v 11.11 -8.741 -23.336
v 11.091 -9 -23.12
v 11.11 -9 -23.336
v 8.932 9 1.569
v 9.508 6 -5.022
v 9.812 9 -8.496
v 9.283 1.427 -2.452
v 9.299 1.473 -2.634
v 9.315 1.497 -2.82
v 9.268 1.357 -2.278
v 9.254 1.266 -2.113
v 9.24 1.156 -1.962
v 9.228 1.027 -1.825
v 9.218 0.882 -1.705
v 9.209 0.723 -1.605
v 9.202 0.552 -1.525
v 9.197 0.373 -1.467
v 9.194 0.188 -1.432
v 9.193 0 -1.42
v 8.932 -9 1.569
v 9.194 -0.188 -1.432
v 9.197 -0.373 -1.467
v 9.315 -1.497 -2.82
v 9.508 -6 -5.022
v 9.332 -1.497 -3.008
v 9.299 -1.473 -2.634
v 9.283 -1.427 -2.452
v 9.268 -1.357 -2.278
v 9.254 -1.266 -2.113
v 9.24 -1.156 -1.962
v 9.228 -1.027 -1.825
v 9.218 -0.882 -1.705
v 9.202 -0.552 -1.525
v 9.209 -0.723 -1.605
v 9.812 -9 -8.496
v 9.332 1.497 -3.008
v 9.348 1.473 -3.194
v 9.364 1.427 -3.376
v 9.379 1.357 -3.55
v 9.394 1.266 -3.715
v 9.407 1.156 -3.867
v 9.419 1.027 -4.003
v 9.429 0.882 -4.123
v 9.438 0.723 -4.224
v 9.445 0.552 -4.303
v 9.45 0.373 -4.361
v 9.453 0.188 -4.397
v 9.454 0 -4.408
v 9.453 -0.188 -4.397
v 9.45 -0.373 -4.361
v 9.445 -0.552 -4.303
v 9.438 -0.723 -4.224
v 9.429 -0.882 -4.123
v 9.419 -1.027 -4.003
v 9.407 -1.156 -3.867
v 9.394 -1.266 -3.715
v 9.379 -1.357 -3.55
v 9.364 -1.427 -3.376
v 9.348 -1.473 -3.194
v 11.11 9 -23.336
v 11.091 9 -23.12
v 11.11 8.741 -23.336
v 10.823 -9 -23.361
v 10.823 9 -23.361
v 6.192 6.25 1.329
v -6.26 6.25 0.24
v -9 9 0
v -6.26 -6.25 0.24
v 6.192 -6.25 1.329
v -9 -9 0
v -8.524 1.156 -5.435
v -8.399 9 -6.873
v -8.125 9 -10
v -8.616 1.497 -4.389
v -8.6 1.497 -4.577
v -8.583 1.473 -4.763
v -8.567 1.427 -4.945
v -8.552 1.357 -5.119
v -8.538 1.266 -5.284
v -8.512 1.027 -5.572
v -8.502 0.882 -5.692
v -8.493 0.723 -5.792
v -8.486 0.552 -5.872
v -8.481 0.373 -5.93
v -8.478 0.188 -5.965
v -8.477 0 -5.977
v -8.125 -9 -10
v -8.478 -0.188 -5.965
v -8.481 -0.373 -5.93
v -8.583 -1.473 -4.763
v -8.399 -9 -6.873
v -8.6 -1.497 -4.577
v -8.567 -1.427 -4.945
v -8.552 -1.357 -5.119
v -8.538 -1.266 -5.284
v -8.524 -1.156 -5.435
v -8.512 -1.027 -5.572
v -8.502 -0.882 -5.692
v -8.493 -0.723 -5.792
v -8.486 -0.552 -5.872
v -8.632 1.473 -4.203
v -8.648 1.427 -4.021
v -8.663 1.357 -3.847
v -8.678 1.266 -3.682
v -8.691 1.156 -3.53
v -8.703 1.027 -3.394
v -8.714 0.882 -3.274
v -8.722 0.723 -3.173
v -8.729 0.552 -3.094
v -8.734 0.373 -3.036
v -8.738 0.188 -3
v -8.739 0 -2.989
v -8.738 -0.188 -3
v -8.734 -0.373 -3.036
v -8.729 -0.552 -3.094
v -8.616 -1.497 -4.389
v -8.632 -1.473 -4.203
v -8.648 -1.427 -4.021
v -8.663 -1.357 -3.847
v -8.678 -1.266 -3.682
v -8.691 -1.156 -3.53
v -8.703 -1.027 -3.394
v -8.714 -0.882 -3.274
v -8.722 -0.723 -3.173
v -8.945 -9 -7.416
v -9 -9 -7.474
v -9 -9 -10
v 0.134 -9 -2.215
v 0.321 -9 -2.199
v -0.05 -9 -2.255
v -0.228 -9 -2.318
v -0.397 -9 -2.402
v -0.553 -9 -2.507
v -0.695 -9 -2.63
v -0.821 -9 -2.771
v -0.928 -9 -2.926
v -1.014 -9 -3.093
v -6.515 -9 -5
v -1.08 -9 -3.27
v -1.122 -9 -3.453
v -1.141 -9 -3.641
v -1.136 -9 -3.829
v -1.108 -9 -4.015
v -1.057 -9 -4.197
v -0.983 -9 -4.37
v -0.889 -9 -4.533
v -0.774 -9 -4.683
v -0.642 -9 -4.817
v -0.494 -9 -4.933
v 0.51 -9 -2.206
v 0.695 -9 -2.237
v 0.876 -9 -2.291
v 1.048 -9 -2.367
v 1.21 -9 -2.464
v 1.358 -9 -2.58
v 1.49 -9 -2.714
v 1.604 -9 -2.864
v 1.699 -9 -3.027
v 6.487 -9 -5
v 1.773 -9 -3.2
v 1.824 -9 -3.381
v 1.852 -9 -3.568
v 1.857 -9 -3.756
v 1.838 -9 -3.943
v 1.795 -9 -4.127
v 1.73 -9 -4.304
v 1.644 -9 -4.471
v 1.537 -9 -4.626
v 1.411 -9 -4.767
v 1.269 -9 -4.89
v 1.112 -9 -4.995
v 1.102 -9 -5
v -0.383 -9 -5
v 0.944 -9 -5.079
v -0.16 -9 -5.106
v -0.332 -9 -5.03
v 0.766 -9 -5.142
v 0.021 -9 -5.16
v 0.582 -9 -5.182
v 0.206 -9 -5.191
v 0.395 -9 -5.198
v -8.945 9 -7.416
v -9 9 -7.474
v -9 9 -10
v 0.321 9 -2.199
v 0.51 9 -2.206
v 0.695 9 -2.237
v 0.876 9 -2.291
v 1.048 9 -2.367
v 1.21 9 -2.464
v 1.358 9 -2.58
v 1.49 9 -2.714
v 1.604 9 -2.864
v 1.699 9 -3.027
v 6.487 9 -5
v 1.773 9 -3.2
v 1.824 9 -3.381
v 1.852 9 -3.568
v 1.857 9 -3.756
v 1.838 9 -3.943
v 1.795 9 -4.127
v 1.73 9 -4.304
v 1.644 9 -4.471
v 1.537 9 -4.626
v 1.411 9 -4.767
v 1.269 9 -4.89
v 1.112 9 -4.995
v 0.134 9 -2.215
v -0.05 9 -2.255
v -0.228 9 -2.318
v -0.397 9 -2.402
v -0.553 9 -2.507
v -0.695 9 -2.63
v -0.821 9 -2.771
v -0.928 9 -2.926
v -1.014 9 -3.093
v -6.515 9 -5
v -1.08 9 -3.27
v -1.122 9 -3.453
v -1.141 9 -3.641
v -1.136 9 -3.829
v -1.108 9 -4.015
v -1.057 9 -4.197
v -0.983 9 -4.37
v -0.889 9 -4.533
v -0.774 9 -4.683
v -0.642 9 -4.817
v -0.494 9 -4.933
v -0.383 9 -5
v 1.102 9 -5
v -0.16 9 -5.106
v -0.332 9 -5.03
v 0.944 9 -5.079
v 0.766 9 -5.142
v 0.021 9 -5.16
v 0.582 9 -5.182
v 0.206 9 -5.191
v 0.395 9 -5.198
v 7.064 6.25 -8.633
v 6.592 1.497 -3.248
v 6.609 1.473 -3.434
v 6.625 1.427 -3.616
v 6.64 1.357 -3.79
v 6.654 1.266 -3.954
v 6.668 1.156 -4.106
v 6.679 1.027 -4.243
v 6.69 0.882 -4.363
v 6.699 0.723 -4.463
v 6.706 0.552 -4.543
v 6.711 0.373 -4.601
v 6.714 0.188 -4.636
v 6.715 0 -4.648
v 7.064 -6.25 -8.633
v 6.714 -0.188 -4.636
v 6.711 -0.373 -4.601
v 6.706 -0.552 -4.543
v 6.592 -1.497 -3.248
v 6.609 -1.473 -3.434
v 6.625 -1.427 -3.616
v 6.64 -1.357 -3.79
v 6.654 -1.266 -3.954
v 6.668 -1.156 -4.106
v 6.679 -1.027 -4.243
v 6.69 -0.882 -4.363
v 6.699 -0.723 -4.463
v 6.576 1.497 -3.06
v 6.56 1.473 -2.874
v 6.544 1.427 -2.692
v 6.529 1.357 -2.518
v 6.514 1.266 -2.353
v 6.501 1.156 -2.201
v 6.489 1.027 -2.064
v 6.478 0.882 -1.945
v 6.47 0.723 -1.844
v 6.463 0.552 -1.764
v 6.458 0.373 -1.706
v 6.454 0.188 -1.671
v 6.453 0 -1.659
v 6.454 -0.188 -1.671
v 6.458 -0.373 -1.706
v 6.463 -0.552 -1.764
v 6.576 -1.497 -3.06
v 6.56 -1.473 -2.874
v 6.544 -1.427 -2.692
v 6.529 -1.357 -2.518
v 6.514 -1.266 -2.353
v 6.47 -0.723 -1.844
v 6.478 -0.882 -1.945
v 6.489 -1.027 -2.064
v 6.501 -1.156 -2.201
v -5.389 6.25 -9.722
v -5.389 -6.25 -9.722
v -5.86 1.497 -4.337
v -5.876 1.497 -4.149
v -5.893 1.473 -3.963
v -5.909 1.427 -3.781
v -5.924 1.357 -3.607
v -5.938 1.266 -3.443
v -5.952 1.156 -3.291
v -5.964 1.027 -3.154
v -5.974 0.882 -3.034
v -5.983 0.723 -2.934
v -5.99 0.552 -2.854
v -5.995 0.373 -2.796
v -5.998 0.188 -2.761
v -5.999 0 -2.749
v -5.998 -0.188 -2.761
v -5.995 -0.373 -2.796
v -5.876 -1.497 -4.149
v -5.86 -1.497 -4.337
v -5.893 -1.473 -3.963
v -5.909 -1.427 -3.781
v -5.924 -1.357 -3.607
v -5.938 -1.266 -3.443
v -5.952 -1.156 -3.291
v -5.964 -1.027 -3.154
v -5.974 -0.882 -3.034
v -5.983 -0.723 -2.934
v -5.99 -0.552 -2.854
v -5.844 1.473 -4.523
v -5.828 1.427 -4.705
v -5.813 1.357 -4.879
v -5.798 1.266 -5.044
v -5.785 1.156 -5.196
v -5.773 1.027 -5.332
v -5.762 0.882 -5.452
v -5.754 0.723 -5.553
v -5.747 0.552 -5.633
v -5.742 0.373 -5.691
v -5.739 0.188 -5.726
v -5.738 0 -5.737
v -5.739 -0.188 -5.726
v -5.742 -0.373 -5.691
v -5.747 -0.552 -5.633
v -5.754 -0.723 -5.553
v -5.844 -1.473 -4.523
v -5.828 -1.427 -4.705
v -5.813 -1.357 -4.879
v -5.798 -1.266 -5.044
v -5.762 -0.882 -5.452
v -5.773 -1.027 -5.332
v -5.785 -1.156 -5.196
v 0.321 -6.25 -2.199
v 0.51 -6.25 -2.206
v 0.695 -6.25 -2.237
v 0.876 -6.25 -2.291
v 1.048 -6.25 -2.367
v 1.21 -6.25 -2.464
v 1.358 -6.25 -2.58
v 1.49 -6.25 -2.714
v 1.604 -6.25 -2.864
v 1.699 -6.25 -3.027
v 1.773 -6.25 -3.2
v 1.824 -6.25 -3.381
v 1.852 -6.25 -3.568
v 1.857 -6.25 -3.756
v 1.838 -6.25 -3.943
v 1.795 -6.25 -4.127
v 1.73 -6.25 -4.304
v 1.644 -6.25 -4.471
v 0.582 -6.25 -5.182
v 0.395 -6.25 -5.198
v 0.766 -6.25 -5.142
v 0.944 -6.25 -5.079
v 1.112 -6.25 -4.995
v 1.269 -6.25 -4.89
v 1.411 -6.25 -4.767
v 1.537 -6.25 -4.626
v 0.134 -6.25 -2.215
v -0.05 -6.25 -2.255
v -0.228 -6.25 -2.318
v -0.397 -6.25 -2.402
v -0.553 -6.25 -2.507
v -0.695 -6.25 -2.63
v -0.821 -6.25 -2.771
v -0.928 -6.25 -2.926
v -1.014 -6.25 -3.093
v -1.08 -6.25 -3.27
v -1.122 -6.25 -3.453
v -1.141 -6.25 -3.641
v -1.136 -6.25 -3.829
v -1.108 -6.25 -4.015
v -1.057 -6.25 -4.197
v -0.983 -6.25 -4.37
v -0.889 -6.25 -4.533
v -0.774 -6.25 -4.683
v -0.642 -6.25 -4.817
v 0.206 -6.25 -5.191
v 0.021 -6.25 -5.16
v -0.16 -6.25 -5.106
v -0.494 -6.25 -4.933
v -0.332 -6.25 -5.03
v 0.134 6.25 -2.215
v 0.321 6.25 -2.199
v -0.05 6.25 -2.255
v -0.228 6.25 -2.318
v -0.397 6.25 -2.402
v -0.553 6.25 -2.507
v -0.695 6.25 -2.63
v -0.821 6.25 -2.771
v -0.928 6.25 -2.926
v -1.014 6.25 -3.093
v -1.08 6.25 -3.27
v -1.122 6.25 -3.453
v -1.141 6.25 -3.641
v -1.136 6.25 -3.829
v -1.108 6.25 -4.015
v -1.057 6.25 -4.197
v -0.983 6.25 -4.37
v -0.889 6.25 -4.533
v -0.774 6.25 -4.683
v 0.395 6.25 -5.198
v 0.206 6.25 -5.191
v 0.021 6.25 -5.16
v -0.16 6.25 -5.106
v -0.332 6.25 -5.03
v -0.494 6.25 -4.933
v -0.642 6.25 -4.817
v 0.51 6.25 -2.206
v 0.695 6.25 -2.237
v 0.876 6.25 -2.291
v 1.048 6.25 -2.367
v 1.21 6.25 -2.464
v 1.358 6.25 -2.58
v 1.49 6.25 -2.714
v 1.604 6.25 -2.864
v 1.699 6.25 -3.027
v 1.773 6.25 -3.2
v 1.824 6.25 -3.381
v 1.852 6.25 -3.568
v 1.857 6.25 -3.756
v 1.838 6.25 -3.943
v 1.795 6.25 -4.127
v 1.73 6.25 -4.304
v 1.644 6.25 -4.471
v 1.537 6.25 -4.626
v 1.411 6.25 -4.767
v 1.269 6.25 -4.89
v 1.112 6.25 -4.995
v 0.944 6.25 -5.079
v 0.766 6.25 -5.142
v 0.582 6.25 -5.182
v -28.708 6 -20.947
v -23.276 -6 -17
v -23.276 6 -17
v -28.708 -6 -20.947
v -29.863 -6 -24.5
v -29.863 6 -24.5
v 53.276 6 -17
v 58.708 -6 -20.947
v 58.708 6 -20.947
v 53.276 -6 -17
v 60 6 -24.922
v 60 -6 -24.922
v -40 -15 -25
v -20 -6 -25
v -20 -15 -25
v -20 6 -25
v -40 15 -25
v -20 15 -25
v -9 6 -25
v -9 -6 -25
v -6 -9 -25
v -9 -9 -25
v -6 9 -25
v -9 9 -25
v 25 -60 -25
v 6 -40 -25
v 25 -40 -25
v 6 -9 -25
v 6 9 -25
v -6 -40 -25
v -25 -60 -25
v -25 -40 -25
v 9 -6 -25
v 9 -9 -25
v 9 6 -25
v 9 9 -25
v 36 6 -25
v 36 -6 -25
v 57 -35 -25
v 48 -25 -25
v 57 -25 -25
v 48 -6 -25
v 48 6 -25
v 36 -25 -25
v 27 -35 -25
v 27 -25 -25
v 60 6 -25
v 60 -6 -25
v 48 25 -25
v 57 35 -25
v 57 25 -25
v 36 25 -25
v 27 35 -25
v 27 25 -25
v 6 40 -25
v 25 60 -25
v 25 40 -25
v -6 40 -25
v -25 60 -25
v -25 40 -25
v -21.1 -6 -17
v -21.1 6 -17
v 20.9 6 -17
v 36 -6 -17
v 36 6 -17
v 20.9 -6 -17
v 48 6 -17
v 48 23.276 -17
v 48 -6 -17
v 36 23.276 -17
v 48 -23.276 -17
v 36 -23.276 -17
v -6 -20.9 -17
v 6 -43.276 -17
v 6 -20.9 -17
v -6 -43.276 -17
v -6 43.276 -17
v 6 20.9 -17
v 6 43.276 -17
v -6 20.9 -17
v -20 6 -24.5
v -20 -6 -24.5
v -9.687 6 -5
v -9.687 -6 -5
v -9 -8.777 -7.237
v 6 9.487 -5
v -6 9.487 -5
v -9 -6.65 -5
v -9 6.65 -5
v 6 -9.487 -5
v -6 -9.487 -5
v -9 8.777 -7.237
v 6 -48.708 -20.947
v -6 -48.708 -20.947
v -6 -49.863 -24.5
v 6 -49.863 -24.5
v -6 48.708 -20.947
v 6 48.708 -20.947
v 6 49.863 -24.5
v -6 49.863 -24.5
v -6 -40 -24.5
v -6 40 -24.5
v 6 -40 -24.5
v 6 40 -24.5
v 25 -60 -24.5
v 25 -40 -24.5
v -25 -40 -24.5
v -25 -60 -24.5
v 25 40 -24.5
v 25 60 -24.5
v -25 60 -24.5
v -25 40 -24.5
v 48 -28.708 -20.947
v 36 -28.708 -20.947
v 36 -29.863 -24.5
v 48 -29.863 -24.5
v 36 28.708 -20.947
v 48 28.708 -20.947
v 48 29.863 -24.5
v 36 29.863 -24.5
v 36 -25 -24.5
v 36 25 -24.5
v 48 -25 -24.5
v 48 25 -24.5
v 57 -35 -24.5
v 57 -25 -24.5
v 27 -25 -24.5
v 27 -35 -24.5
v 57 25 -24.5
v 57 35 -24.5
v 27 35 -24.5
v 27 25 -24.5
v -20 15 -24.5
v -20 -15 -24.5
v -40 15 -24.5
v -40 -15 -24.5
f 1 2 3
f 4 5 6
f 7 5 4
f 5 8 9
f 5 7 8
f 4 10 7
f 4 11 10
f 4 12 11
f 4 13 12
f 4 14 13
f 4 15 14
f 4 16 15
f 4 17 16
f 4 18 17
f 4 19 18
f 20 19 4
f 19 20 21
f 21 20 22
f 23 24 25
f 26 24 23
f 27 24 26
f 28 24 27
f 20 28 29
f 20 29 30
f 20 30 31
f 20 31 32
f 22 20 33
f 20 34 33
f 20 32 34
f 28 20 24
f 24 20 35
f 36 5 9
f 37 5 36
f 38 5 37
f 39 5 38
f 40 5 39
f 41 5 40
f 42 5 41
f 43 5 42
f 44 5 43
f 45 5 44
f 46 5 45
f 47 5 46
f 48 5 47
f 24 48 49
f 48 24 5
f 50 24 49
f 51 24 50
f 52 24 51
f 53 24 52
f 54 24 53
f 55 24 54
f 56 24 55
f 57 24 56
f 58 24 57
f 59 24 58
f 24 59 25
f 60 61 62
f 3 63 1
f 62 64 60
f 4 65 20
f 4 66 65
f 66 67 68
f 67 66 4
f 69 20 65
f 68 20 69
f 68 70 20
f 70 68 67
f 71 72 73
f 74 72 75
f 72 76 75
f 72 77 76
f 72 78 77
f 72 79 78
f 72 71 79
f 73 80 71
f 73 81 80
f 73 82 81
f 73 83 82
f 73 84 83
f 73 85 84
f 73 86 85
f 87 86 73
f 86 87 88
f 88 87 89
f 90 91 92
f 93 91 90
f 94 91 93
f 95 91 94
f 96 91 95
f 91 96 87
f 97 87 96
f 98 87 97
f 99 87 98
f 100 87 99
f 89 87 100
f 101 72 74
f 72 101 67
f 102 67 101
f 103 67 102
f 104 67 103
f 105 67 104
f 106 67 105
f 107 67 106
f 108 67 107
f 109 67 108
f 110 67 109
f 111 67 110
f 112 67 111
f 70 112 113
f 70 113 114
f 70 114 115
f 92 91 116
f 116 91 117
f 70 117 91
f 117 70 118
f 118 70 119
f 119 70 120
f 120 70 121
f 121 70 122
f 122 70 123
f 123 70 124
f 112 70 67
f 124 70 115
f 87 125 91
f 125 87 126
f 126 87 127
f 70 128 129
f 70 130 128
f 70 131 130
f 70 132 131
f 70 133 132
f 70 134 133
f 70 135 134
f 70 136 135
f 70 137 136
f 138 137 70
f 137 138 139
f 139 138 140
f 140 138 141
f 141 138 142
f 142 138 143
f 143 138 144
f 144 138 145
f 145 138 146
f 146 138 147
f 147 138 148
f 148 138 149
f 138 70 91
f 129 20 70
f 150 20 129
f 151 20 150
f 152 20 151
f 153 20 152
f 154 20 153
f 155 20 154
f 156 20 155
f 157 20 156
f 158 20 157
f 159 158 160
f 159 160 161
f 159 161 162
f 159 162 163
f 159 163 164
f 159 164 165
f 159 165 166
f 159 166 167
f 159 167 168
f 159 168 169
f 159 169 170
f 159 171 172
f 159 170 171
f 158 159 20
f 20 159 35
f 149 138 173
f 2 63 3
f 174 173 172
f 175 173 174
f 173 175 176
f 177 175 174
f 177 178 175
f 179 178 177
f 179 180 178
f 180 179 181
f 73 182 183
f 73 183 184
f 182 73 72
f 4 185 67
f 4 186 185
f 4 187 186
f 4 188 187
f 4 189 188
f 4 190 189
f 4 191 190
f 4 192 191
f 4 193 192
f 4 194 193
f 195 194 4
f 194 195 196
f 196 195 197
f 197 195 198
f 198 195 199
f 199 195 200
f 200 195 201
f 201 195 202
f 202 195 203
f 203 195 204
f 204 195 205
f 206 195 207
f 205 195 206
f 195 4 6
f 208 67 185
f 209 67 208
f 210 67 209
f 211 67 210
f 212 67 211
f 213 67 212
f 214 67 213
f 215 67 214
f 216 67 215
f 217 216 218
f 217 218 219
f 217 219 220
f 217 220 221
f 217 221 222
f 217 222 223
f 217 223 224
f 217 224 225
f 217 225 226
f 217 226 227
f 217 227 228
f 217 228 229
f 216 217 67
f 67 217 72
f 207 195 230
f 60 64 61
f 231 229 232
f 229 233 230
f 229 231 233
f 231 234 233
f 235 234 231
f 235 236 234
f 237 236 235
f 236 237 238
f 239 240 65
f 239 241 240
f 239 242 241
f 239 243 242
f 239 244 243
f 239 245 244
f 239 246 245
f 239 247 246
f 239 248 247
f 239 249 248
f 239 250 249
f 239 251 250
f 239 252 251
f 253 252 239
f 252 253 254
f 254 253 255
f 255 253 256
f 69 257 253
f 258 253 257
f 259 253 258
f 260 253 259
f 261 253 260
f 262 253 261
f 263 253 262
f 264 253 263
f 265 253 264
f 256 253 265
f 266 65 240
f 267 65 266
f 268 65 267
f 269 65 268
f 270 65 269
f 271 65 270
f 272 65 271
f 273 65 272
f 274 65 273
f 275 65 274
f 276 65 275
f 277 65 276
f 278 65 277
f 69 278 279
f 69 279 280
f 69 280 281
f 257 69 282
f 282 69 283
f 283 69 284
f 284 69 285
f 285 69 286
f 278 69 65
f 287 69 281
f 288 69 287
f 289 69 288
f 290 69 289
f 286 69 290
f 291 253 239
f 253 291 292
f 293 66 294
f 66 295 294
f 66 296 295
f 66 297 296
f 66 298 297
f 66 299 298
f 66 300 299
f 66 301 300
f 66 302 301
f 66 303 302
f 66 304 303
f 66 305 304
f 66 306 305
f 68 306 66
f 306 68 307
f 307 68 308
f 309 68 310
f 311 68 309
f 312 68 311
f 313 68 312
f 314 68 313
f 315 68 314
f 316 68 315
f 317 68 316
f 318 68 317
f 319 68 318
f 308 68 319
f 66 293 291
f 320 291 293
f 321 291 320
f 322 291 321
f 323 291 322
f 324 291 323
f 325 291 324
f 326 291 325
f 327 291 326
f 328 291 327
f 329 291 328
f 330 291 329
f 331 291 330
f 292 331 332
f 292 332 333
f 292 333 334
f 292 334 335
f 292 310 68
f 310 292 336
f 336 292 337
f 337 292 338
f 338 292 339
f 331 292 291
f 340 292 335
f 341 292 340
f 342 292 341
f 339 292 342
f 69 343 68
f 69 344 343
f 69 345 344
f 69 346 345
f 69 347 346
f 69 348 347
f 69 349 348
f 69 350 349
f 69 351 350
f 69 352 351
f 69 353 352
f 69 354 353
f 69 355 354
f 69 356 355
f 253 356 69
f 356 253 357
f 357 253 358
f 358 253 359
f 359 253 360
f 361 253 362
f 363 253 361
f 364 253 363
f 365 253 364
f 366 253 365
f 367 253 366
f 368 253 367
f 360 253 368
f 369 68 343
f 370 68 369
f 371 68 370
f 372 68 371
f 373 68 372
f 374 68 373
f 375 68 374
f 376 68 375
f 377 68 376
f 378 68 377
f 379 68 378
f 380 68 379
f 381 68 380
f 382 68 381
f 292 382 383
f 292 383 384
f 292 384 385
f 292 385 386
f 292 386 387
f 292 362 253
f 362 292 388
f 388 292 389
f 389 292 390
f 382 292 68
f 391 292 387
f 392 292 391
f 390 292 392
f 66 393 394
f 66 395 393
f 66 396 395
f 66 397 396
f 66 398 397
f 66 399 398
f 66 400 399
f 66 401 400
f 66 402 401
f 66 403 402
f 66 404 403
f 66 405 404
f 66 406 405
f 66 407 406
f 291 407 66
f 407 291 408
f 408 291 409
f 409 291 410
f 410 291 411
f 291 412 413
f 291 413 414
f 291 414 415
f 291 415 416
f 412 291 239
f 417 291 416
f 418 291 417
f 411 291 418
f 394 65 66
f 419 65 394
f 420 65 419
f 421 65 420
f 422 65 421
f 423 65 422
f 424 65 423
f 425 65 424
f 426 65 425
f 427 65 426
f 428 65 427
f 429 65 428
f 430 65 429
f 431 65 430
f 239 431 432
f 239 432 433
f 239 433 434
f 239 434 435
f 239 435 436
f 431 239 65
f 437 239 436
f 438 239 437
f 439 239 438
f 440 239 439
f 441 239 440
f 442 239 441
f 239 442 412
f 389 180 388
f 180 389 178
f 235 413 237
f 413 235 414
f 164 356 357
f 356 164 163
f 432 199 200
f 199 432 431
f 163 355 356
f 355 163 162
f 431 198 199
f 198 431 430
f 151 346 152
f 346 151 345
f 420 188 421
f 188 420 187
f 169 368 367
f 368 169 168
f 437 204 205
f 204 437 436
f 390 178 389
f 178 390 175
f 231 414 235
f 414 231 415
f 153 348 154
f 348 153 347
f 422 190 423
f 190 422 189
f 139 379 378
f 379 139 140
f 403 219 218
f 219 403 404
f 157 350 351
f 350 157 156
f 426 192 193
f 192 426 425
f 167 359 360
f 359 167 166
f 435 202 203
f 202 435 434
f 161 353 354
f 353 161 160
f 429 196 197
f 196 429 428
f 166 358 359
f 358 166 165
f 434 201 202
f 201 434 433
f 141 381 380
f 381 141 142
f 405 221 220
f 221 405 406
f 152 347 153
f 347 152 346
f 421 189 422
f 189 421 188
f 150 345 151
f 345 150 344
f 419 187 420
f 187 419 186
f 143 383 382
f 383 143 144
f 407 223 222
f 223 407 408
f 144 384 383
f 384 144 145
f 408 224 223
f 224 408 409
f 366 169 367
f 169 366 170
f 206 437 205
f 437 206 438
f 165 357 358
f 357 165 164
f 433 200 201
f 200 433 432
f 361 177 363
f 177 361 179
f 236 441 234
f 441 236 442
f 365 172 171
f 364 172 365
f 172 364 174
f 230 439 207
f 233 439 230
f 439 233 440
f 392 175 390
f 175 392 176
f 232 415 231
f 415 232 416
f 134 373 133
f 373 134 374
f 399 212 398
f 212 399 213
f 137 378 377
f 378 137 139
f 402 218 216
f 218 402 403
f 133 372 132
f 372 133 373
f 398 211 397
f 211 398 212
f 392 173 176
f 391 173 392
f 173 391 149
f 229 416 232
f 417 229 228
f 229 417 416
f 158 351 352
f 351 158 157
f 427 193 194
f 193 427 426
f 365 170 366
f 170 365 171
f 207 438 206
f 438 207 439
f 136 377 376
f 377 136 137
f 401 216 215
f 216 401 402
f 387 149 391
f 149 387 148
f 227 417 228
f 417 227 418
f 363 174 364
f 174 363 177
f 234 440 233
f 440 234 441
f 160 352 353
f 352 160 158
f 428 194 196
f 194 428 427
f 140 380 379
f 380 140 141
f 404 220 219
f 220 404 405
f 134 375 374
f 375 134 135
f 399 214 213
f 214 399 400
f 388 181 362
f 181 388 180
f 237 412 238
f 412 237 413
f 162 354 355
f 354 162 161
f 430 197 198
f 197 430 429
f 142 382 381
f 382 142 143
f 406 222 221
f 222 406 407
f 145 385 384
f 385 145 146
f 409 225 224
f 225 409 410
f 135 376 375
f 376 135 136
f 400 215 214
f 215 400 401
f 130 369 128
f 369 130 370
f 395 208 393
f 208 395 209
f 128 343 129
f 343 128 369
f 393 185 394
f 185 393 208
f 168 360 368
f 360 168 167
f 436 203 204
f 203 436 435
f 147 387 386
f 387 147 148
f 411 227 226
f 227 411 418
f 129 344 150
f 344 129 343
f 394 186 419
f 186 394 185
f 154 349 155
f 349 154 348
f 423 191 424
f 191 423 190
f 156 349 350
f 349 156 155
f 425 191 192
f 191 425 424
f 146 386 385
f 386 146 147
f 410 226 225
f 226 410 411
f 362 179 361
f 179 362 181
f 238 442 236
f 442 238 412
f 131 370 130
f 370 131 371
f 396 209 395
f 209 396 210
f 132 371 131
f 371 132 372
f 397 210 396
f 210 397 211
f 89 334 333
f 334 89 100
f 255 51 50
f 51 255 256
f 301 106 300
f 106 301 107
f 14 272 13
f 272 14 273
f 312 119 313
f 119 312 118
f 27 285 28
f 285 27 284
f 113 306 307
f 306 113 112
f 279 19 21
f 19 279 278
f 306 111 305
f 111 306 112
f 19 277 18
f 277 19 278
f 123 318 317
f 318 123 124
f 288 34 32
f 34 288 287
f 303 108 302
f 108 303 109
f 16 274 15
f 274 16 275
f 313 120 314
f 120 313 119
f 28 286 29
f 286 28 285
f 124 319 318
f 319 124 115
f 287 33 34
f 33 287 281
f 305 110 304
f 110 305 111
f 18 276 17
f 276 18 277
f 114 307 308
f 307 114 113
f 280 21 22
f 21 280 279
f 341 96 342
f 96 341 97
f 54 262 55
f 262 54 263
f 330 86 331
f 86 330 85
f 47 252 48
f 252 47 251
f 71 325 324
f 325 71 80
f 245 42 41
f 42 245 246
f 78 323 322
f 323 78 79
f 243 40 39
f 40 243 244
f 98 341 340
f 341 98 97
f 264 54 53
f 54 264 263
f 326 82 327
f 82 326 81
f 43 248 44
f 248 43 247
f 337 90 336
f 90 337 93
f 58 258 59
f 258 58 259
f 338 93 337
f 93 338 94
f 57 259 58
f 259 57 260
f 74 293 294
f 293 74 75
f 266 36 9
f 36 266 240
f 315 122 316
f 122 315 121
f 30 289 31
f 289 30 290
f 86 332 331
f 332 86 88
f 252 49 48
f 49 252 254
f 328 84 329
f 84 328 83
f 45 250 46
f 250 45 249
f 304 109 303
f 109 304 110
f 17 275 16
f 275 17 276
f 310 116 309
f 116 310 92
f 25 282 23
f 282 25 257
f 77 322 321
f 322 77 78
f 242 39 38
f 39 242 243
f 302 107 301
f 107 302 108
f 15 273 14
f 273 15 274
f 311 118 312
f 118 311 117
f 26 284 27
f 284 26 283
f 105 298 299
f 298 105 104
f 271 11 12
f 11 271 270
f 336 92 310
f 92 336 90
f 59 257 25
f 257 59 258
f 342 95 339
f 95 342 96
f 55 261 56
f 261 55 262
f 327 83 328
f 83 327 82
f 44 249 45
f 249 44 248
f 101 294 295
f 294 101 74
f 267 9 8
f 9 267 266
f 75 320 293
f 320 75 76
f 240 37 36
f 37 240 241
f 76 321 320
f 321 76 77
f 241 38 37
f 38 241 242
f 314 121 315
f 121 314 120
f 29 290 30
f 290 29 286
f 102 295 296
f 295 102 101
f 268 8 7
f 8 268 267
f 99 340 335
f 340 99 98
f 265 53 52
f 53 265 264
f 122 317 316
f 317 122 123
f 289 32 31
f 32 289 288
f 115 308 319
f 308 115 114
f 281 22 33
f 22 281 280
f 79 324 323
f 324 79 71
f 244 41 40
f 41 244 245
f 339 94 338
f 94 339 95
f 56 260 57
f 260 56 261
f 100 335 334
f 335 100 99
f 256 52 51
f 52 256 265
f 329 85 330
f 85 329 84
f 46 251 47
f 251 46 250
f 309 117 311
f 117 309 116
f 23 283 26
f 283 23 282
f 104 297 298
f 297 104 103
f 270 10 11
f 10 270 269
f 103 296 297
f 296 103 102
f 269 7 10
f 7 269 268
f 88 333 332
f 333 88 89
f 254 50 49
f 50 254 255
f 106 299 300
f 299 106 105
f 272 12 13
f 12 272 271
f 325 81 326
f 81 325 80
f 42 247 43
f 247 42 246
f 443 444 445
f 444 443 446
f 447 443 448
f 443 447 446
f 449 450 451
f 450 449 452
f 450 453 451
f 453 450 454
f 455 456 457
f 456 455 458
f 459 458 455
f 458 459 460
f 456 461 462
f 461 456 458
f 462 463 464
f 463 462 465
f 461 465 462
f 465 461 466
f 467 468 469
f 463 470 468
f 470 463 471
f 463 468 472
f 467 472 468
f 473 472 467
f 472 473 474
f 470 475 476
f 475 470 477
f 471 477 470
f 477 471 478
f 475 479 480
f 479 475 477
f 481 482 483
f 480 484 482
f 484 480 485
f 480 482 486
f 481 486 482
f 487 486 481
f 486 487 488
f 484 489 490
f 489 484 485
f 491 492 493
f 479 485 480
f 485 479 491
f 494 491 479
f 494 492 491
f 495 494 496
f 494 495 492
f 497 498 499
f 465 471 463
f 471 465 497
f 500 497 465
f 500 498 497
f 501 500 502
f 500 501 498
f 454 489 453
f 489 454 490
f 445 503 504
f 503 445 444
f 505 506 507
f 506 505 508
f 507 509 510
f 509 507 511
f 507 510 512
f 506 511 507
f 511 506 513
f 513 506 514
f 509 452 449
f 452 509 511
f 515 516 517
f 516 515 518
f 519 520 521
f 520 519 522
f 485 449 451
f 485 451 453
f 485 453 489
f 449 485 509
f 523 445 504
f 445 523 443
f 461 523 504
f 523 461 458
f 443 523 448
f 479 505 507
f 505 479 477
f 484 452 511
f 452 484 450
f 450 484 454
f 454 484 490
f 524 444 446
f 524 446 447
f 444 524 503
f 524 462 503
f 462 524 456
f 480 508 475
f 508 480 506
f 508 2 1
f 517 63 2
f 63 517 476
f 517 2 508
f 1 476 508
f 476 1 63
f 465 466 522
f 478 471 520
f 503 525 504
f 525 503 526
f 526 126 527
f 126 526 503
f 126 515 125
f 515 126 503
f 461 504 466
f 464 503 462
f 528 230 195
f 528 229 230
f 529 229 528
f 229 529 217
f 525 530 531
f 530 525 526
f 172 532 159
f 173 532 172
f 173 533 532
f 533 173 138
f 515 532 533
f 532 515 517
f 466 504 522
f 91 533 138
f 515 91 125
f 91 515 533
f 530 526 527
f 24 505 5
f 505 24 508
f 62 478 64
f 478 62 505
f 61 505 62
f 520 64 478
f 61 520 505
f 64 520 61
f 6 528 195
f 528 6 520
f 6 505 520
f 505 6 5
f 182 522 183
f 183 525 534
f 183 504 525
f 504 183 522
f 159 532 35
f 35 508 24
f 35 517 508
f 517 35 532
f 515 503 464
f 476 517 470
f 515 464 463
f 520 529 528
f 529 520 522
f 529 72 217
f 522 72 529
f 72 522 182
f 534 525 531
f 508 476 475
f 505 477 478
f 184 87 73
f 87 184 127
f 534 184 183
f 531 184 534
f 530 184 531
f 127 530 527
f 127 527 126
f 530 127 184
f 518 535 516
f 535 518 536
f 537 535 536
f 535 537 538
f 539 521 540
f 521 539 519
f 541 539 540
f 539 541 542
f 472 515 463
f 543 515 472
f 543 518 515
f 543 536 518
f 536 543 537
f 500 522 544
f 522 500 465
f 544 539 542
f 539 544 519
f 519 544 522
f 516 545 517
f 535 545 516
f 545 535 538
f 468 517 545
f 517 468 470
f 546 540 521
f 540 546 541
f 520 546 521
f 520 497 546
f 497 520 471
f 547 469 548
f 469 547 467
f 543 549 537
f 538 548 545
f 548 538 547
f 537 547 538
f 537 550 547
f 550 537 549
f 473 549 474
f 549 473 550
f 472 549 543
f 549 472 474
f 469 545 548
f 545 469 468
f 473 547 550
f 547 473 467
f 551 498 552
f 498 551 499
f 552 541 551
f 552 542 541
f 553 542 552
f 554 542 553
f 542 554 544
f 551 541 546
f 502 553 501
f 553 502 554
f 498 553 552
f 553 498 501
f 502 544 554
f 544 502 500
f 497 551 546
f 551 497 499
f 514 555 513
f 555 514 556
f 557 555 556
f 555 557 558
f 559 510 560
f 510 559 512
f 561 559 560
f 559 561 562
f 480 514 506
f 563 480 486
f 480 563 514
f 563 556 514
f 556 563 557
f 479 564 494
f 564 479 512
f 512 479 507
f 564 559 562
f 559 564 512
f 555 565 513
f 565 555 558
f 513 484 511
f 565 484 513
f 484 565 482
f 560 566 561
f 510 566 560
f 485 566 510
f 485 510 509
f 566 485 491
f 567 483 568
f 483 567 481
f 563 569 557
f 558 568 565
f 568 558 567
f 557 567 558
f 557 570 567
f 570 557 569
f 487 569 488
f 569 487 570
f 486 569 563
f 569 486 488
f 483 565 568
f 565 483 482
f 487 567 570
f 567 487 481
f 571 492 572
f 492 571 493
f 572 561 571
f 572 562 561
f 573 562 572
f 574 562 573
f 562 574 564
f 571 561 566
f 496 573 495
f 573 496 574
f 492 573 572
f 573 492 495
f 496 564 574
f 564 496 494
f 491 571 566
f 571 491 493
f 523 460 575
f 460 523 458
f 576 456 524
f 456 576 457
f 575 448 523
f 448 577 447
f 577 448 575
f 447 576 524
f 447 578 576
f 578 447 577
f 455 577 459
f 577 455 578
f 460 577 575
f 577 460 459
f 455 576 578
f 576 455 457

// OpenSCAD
/* [Configuration] */

// How many levels do you want to display?
Number_Of_Levels=2; // [1,2,3,4,5]

// What should the top size be?
Top_Size = "Medium"; // [Small,Medium,Large,Silly]

// Include Top Front Stopper?
Top_Front_Stopper = false; // [true,false]

// What would you like the Style to be?
Shape_Style = "Hull"; // [RoundedCorner,Hull]

// What would you like the roof to look like?
Hat_Style = "Pyramid"; // [Pyramid,Sphere,None]

// Add Printing frame for flat print?
Print_Tab = true; // [true,false]

// Separate object generation - Base, Back Bottom, Back Standard, Top Side, Top Front
part = "base"; // [base:Base Only,back:Back Only,topside:Top Side Only,topfront:Top Front Only,all:All]

/* [Hidden] */
fn= (Shape_Style == "Hull") ? 10 : 100;

// What should be the top side length?
Top_Side_Length= (Top_Size == "Silly") ? 80 : (Top_Size == "Medium") ? 40 : (Top_Size == "Large") ? 60 :  40;
Top_Front_Length= (Top_Size == "Silly") ? 110 : (Top_Size == "Medium") ? 60 : (Top_Size == "Large") ? 80 :  30;

bridge_height=60;
bridge_width=30;
bridge_length=40;
bridge_thickness=5;
bridge_forwardposition=30;
bridge_topposition1=0;
frame_height1=bridge_topposition1+25;
frame_thickness=12;
back_height=65;
wall_thick=6;
corner_radius = wall_thick*2;
bottomframeWidth1=100; // [80:200]
bottomframeWidth2=60; // [40:100]

sidebar_length=30;
frontbar_length=40;
feet_height=8;

// V4
// Another top which is slanted
// Mustash top?
// Add holes in top side for glasses frame (as guide on insertion)

//buildBridge(bridge_topposition1-20);
//buildBridge(bridge_topposition2-15);


print_part();


module print_part() {

	if (part == "base") {
		buildBase();
	} else if (part == "back") {
		buildBack(true,(back_height),(frame_height1));
	} else if (part == "topside") {
		smalltopside((frame_height1-5));
	} else if (part == "topfront") {
		smalltopfront((frame_height1-5));
	} else if (part == "all") {
		all();
	} else {
		all();
	}

}




module all() {

	translate([0,0,-10]) buildBase();
	rotate([0,-4,0]) buildBack(true,back_height,frame_height1);

	rotate([0,-4,0]) smalltopside(frame_height1);
	rotate([0,-4,180]) smalltopside(frame_height1);
	rotate([0,-4,0]) smalltopfront(frame_height1);

	for ( i = [2 : 1 : Number_Of_Levels] )
	{
		translate([(-3*i),0,(back_height)*(i-1)+5]) rotate([0,-4,0]) buildBack(true,(back_height),(frame_height1));
		translate([(-3*i),0,(back_height)*(i-1)+5]) rotate([0,-4,0]) smalltopside((frame_height1));
		translate([(-3*i),0,(back_height)*(i-1)+5]) rotate([0,-4,180]) smalltopside((frame_height1));
		translate([(-3*i),0,(back_height)*(i-1)+5]) rotate([0,-4,0]) smalltopfront((frame_height1));
	}

	// Build little pyramid hat to go on top
	rotate([0,-4,0]) translate([0,0,(back_height*Number_Of_Levels)+5]) buildRoof();
}




module fulltop() {
	//Wings for full frame holding
	//translate([-3,-10,frame_height1]) hmaleBar(sidebar_length, ginnerWidth, gouterWidth, gcrossOver);
	//rotate([0,0,180]) translate([-3,-10,frame_height1]) hmaleBar(sidebar_length, ginnerWidth, gouterWidth, gcrossOver);
	//rotate([0,0,90]) translate([-3,-10,frame_height1]) hmaleBar(frontbar_length, ginnerWidth, gouterWidth, gcrossOver);
}


module smalltopfront(iframeheight) {
	rotate([0,0,90]) translate([-gouterWidth/2,-30,iframeheight]) hmaleBar(9, ginnerWidth, gouterWidth, gcrossOver);

	rotate([0,0,90]) difference() {
		union() {
			translate([0,-40,iframeheight+5]) rotate([90,0,0]) scale([1.5,1,1]) cylinder(Top_Front_Length,7,7,$fn=fn);
			translate([0,-40,iframeheight+5+2.5]) cube(size=[20,2,20],center=true);
			if (Top_Front_Stopper) 
				translate([0,-(40+Top_Front_Length),iframeheight+5+2.5]) cube(size=[20,2,20],center=true);
		}
		translate([0,-12-Top_Front_Length,iframeheight-7]) cube(size=[22,Top_Front_Length*2,20],center=true);
	}
}

module smalltopside(iframeheight) {
	//Wings for small frame holding (colapsed)
	translate([-gouterWidth/2,-30,iframeheight]) hmaleBar(9, ginnerWidth, gouterWidth, gcrossOver);

	difference() {
		union() {
			translate([0,-39,iframeheight+5]) rotate([90,0,0]) cylinder(Top_Side_Length,5,5,$fn=fn);
			translate([0,-39,iframeheight+5+2.5]) cube(size=[12,2,15],center=true);
			translate([0,-39-Top_Side_Length,iframeheight+5+2.5]) cube(size=[12,2,15],center=true);
		}
		translate([0,-11-Top_Side_Length,iframeheight-7]) cube(size=[20,Top_Side_Length*2,20],center=true);
	}
}



module buildRoof() {

	translate([-(gouterWidth)/2,-(gouterWidth)/2,0]) rotate([-90,0,0]) hmaleBar(25, ginnerWidth, gouterWidth, gcrossOver);

	if (Hat_Style == "Pyramid") {
		hull() {
			translate([0,0,20]) rotate([90,0,45]) Isosceles_Triangle(angle=25, H=40, center=true);
			translate([0,0,20]) rotate([90,0,-45]) Isosceles_Triangle(angle=25, H=40, center=true);
		}
	} else if (Hat_Style == "Sphere") {
		translate([0,0,25]) sphere(r=11,center=true);
	} else {

	}
}



module buildBridge(z=0) {
	difference () {
		translate([bridge_forwardposition,0,z]) rotate([0,90,0]) scale([2,1,1]) cylinder(bridge_length,bridge_width,bridge_height,$fn=50);

		translate([bridge_forwardposition-2,0,z]) rotate([0,90,0]) scale([2,1,1]) cylinder(bridge_length+10,bridge_width-bridge_thickness,bridge_height-bridge_thickness,$fn=50);

		// Cut away bottom of bridge
		translate([49+bridge_forwardposition,0,-30+z]) cube(size=[100,100,100],center=true);
	}
}





module buildBack(center=true, ibackheight, iframeheight) {


	// Back
	translate([-(gouterWidth)/2,-(gouterWidth)/2,0]) rotate([-90,0,0]) hmaleBar(25, ginnerWidth, gouterWidth, gcrossOver);
	translate([-3,0,(ibackheight-8)/2]) cube(size=[frame_thickness,frame_thickness,(ibackheight-8)-25],center=true);
	translate([-gouterWidth/2,gouterWidth/2,ibackheight-8]) rotate([90,0,0]) hfemaleBar(25, ginnerWidth, gouterWidth, gwidthGap, gcrossOver);

	// Bottom of Back
if (Shape_Style == "Hull") {
	hull(){
	difference() {
		union() {
			translate([(frame_thickness/2)-3,frame_thickness/2,25]) rotate([0,-90,0]) rounded_corner(0,0,corner_radius,corner_radius,frame_thickness);
			translate([(-frame_thickness/2)-3,-frame_thickness/2,25]) rotate([0,-90,180]) rounded_corner(0,0,corner_radius,corner_radius,frame_thickness);
			translate([(frame_thickness/2)-3,-frame_thickness/2,25]) rotate([0,-90,-90]) rounded_corner(0,0,corner_radius,corner_radius,frame_thickness);
		}

		translate([-3,(-5)-(gouterWidth/2),25]) cube(size=[15,10,10],center=true);
		translate([-3,(+5)+(gouterWidth/2),25]) cube(size=[15,10,10],center=true);
		translate([(+5)+(gouterWidth/2),0,25]) cube(size=[10,15,10],center=true);
	}
	}
}
else {
	difference() {
		union() {
			translate([(frame_thickness/2)-3,frame_thickness/2,25]) rotate([0,-90,0]) rounded_corner(0,0,corner_radius,corner_radius,frame_thickness);
			translate([(-frame_thickness/2)-3,-frame_thickness/2,25]) rotate([0,-90,180]) rounded_corner(0,0,corner_radius,corner_radius,frame_thickness);
			translate([(frame_thickness/2)-3,-frame_thickness/2,25]) rotate([0,-90,-90]) rounded_corner(0,0,corner_radius,corner_radius,frame_thickness);
		}

		translate([-3,(-5)-(gouterWidth/2),25]) cube(size=[15,10,10],center=true);
		translate([-3,(+5)+(gouterWidth/2),25]) cube(size=[15,10,10],center=true);
		translate([(+5)+(gouterWidth/2),0,25]) cube(size=[10,15,10],center=true);
	}
}

	// Curve for middle joint
if (Shape_Style == "Hull") {
	difference() {
	hull() {
		translate([-(frame_thickness/2)-3,(frame_thickness/2),iframeheight]) rotate([0,90,0]) rounded_corner(0,0,corner_radius,corner_radius,frame_thickness);
		translate([(frame_thickness/2)-3,-(frame_thickness/2),iframeheight]) rotate([0,90,180]) rounded_corner(0,0,corner_radius,corner_radius,frame_thickness);
		if(center == true)
			translate([(frame_thickness/2)-3,(frame_thickness/2),iframeheight]) rotate([0,90,-90]) rounded_corner(0,0,corner_radius,corner_radius,frame_thickness);

		translate([(frame_thickness/2)-3,(frame_thickness/2),iframeheight+gouterWidth]) rotate([0,-90,0]) rounded_corner(0,0,corner_radius,corner_radius,frame_thickness);
		translate([-(frame_thickness/2)-3,-(frame_thickness/2),iframeheight+gouterWidth]) rotate([0,-90,180]) rounded_corner(0,0,corner_radius,corner_radius,frame_thickness);
		if(center==true)
			translate([(frame_thickness/2)-3,-(frame_thickness/2),iframeheight+gouterWidth]) rotate([0,-90,-90]) rounded_corner(0,0,corner_radius,corner_radius,frame_thickness);
	}

	translate([0,0,iframeheight+gouterWidth/2]) cube(size=[18,50,gouterWidth-5],center=true);
	translate([0,0,iframeheight+gouterWidth/2]) cube(size=[50,18,gouterWidth-5],center=true);
	translate([0,0,iframeheight+gouterWidth*2]) cube(size=[gouterWidth,gouterWidth,30],center=true);
	}
}
else {
		translate([-(frame_thickness/2)-3,(frame_thickness/2)+2,iframeheight]) rotate([0,90,0]) rounded_corner(0,0,corner_radius,corner_radius,frame_thickness);
		translate([(frame_thickness/2)-3,-(frame_thickness/2)-2,iframeheight]) rotate([0,90,180]) rounded_corner(0,0,corner_radius,corner_radius,frame_thickness);
		if(center == true)
			translate([(frame_thickness/2)+2,(frame_thickness/2),iframeheight]) rotate([0,90,-90]) rounded_corner(0,0,corner_radius,corner_radius,frame_thickness);

		translate([(frame_thickness/2)-3,(frame_thickness/2)+2,iframeheight+gouterWidth]) rotate([0,-90,0]) rounded_corner(0,0,corner_radius,corner_radius,frame_thickness);
		translate([-(frame_thickness/2)-3,-(frame_thickness/2)-2,iframeheight+gouterWidth]) rotate([0,-90,180]) rounded_corner(0,0,corner_radius,corner_radius,frame_thickness);
		if(center==true)
			translate([(frame_thickness/2)+2,-(frame_thickness/2),iframeheight+gouterWidth]) rotate([0,-90,-90]) rounded_corner(0,0,corner_radius,corner_radius,frame_thickness);
}

	// Middle Joint
	translate([-gouterWidth/2,39/2,iframeheight]) femaleBar(39, ginnerWidth, gouterWidth, gwidthGap, gcrossOver);
	if(center==true)
		translate([-gouterWidth/2+3,-gouterWidth/2,iframeheight]) rotate([0,0,90]) femaleBar(25, ginnerWidth, gouterWidth, gwidthGap, gcrossOver);

}






module buildBase() {


	// Bottom1
	translate([-gouterWidth/2,gouterWidth/2,0]) rotate([90,-5,0]) hfemaleBar(25, ginnerWidth, gouterWidth, gwidthGap, gcrossOver);


	difference() {
		translate([bridge_forwardposition/2,0,-21]) rotate([0,90,0]) cube(size=[feet_height,frame_thickness,bridge_forwardposition+60],center=true);

		translate([-31,-(frame_thickness+2)/2,-16]) rotate([-90,0,0]) rounded_corner(0,0,corner_radius,corner_radius,frame_thickness+2);
		translate([bridge_forwardposition+31,(frame_thickness+2)/2,-16]) rotate([-90,0,180]) rounded_corner(0,0,corner_radius,corner_radius,frame_thickness+2);
	}

	if(Print_Tab) {
		translate([-30,0,-24.75]) cube(size=[20,30,0.5],center=true);
	}

	// Curve for bottom joint
if (Shape_Style == "Hull") {
	difference() {
		hull() {
			translate([frame_thickness/2,gouterWidth/2-0.1,-17]) rotate([0,-90,0]) rounded_corner(0,0,corner_radius,corner_radius,frame_thickness);
			translate([-frame_thickness/2,-gouterWidth/2+0.1,-17]) rotate([0,-90,180]) rounded_corner(0,0,corner_radius,corner_radius,frame_thickness);
			translate([gouterWidth/2-0.1,-frame_thickness/2,-17]) rotate([0,-90,-90]) rounded_corner(0,0,corner_radius,corner_radius,frame_thickness);
			translate([-gouterWidth/2-0.1,frame_thickness/2,-17]) rotate([0,-90,90]) rounded_corner(0,0,corner_radius,corner_radius,frame_thickness);

			translate([0,0,-23]) cube(size=[gouterWidth,gouterWidth,4],center=true);
		}

		translate([0,0,0]) cube(size=[gouterWidth,gouterWidth,20],center=true);
	}
}
else {
		translate([frame_thickness/2,gouterWidth/2-0.1,-17]) rotate([0,-90,0]) rounded_corner(0,0,corner_radius,corner_radius,frame_thickness);
		translate([-frame_thickness/2,-gouterWidth/2+0.1,-17]) rotate([0,-90,180]) rounded_corner(0,0,corner_radius,corner_radius,frame_thickness);
		translate([gouterWidth/2-0.1,-frame_thickness/2,-17]) rotate([0,-90,-90]) rounded_corner(0,0,corner_radius,corner_radius,frame_thickness);
		translate([-gouterWidth/2-0.1,frame_thickness/2,-17]) rotate([0,-90,90]) rounded_corner(0,0,corner_radius,corner_radius,frame_thickness);
}
	// Base bottom
	difference() {
		translate([0,0,-21]) rotate([90,0,0]) cube(size=[frame_thickness,feet_height,bottomframeWidth1],center=true);

		translate([(frame_thickness+2)/2,-(bottomframeWidth1+2)/2,-16]) rotate([-90,0,90]) rounded_corner(0,0,corner_radius,corner_radius,frame_thickness+2);
		translate([-(frame_thickness+2)/2,(bottomframeWidth1+2)/2,-16]) rotate([-90,0,-90]) rounded_corner(0,0,corner_radius,corner_radius,frame_thickness+2);
	}

	if(Print_Tab) {
		translate([0,-(bottomframeWidth1/2),-24.75]) cube(size=[50,20,0.5],center=true);
		translate([0,(bottomframeWidth1/2),-24.75]) cube(size=[50,20,0.5],center=true);
	}

	// Front base1
	difference () {
		translate([bridge_forwardposition+frame_thickness,0,-21]) rotate([90,0,0]) cube(size=[frame_thickness,feet_height,bottomframeWidth2],center=true);

		translate([(bridge_forwardposition)+(frame_thickness*2)-5,-(bottomframeWidth2+2)/2,-16]) rotate([-90,0,90]) rounded_corner(0,0,corner_radius,corner_radius,frame_thickness+2);
		translate([(bridge_forwardposition)+(frame_thickness)/2-1,(bottomframeWidth2+2)/2,-16]) rotate([-90,0,-90]) rounded_corner(0,0,corner_radius,corner_radius,frame_thickness+2);
	}

	if(Print_Tab) {
		translate([bridge_forwardposition+frame_thickness,-(bottomframeWidth2/2),-24.75]) cube(size=[30,10,0.5],center=true);
		translate([bridge_forwardposition+frame_thickness,(bottomframeWidth2/2),-24.75]) cube(size=[30,10,0.5],center=true);
	}
}






module rounded_corner(rx,ry,cx,cy,z) {
        difference() {
            translate(v=[rx,ry,0]) cube([corner_radius,corner_radius,z], center=false);
            translate(v=[cx,cy,-0.5]) cylinder(r=corner_radius, h=z+1, $fn=fn);
        }
}












































/*
Triangles.scad
 Author: Tim Koopman
 https://github.com/tkoopman/Delta-Diamond/blob/master/OpenSCAD/Triangles.scad

         angleCA
           /|\
        a / H \ c
         /  |  \
 angleAB ------- angleBC
            b

Standard Parameters
	center: true/false
		If true same as centerXYZ = [true, true, true]

	centerXYZ: Vector of 3 true/false values [CenterX, CenterY, CenterZ]
		center must be left undef

	height: The 3D height of the Triangle. Ignored if heights defined

	heights: Vector of 3 height values heights @ [angleAB, angleBC, angleCA]
		If CenterZ is true each height will be centered individually, this means
		the shape will be different depending on CenterZ. Most times you will want
		CenterZ to be true to get the shape most people want.
*/

/* 
Triangle
	a: Length of side a
	b: Length of side b
	angle: angle at point angleAB
*/
module Triangle(
			a, b, angle, height=1, heights=undef,
			center=undef, centerXYZ=[false,false,false])
{
	// Calculate Heights at each point
	heightAB = ((heights==undef) ? height : heights[0])/2;
	heightBC = ((heights==undef) ? height : heights[1])/2;
	heightCA = ((heights==undef) ? height : heights[2])/2;
	centerZ = (center || (center==undef && centerXYZ[2]))?0:max(heightAB,heightBC,heightCA);

	// Calculate Offsets for centering
	offsetX = (center || (center==undef && centerXYZ[0]))?((cos(angle)*a)+b)/3:0;
	offsetY = (center || (center==undef && centerXYZ[1]))?(sin(angle)*a)/3:0;
	
	pointAB1 = [-offsetX,-offsetY, centerZ-heightAB];
	pointAB2 = [-offsetX,-offsetY, centerZ+heightAB];
	pointBC1 = [b-offsetX,-offsetY, centerZ-heightBC];
	pointBC2 = [b-offsetX,-offsetY, centerZ+heightBC];
	pointCA1 = [(cos(angle)*a)-offsetX,(sin(angle)*a)-offsetY, centerZ-heightCA];
	pointCA2 = [(cos(angle)*a)-offsetX,(sin(angle)*a)-offsetY, centerZ+heightCA];

	polyhedron(
		points=[	pointAB1, pointBC1, pointCA1,
					pointAB2, pointBC2, pointCA2 ],
		triangles=[	
			[0, 1, 2],
			[3, 5, 4],
			[0, 3, 1],
			[1, 3, 4],
			[1, 4, 2],
			[2, 4, 5],
			[2, 5, 0],
			[0, 5, 3] ] );
}

/*
Isosceles Triangle
	Exactly 2 of the following paramaters must be defined.
	If all 3 defined H will be ignored.
	b: length of side b
	angle: angle at points angleAB & angleBC.
*/
module Isosceles_Triangle(
			b, angle, H=undef, height=1, heights=undef,
			center=undef, centerXYZ=[true, false, false])
{
	valid = 	(angle!=undef)?((angle < 90) && (b!=undef||H!=undef)) : (b!=undef&&H!=undef);
	ANGLE = (angle!=undef) ? angle : atan(H / (b/2));
	a = (b==undef)?(H/sin((180-(angle*2))/2)) : 
		 (b / cos(ANGLE))/2;
	B = (b==undef)? (cos(angle)*a)*2:b;
	if (valid)
	{
		Triangle(a=a, b=B, angle=ANGLE, height=height, heights=heights,
					center=center, centerXYZ=centerXYZ);
	} else {
		echo("Invalid Isosceles_Triangle. Must specify any 2 of b, angle and H, and if angle used angle must be less than 90");
	}
}

/*
Right Angled Triangle
	Create a Right Angled Triangle where the hypotenuse will be calculated.

       |\
      a| \
       |  \
       ----
         b
	a: length of side a
	b: length of side b
*/
module Right_Angled_Triangle(
			a, b, height=1, heights=undef,
			center=undef, centerXYZ=[false, false, false])
{
	Triangle(a=a, b=b, angle=90, height=height, heights=heights,
				center=center, centerXYZ=centerXYZ);
}

/*
Wedge
	Is same as Right Angled Triangle with 2 different heights, and rotated.
	Good for creating support structures.
*/
module Wedge(a, b, w1, w2)
{
	rotate([90,0,0])
		Right_Angled_Triangle(a, b, heights=[w1, w2, w1], centerXYZ=[false, false, true]);
}

/*
Equilateral Triangle
	Create a Equilateral Triangle.

	l: Length of all sides (a, b & c)
	H: Triangle size will be based on the this 2D height
		When using H, l is ignored.
*/
module Equilateral_Triangle(
			l=10, H=undef, height=1, heights=undef,
			center=undef, centerXYZ=[true,false,false])
{
	L = (H==undef)?l:H/sin(60);
	Triangle(a=L,b=L,angle=60,height=height, heights=heights,
				center=center, centerXYZ=centerXYZ);
}

/*
Trapezoid
	Create a Basic Trapezoid (Based on Isosceles_Triangle)

            d
          /----\
         /  |   \
     a  /   H    \ c
       /    |     \
 angle ------------ angle
            b

	b: Length of side b
	angle: Angle at points angleAB & angleBC
	H: The 2D height at which the triangle should be cut to create the trapezoid
	heights: If vector of size 3 (Standard for triangles) both cd & da will be the same height, if vector have 4 values [ab,bc,cd,da] than each point can have different heights.
*/
module Trapezoid(
			b, angle=60, H, height=1, heights=undef,
			center=undef, centerXYZ=[true,false,false])
{
	validAngle = (angle < 90);
	adX = H / tan(angle);

	// Calculate Heights at each point
	heightAB = ((heights==undef) ? height : heights[0])/2;
	heightBC = ((heights==undef) ? height : heights[1])/2;
	heightCD = ((heights==undef) ? height : heights[2])/2;
	heightDA = ((heights==undef) ? height : ((len(heights) > 3)?heights[3]:heights[2]))/2;

	// Centers
	centerX = (center || (center==undef && centerXYZ[0]))?0:b/2;
	centerY = (center || (center==undef && centerXYZ[1]))?0:H/2;
	centerZ = (center || (center==undef && centerXYZ[2]))?0:max(heightAB,heightBC,heightCD,heightDA);

	// Points
	y = H/2;
	bx = b/2;
	dx = (b-(adX*2))/2;

	pointAB1 = [centerX-bx, centerY-y, centerZ-heightAB];
	pointAB2 = [centerX-bx, centerY-y, centerZ+heightAB];
	pointBC1 = [centerX+bx, centerY-y, centerZ-heightBC];
	pointBC2 = [centerX+bx, centerY-y, centerZ+heightBC];
	pointCD1 = [centerX+dx, centerY+y, centerZ-heightCD];
	pointCD2 = [centerX+dx, centerY+y, centerZ+heightCD];
	pointDA1 = [centerX-dx, centerY+y, centerZ-heightDA];
	pointDA2 = [centerX-dx, centerY+y, centerZ+heightDA];

	validH = (adX < b/2);

	if (validAngle && validH)
	{
		polyhedron(
			points=[	pointAB1, pointBC1, pointCD1, pointDA1,
						pointAB2, pointBC2, pointCD2, pointDA2 ],
			triangles=[	
				[0, 1, 2],
				[0, 2, 3],
				[4, 6, 5],
				[4, 7, 6],
				[0, 4, 1],
				[1, 4, 5],
				[1, 5, 2],
				[2, 5, 6],
				[2, 6, 3],
				[3, 6, 7],
				[3, 7, 0],
				[0, 7, 4]	] );
	} else {
		if (!validAngle) echo("Trapezoid invalid, angle must be less than 90");
		else echo("Trapezoid invalid, H is larger than triangle");
	}
}


// Examples
//Triangle(a=5, b=15, angle=33, centerXYZ=[true,false,false]);
//translate([20,0,0]) Right_Angled_Triangle(a=5, b=20, centerXYZ=[false,true,false]);
//translate([45,0,0]) Wedge(a=5, b=20, w1=10, w2=5);
//translate([-20,0,0]) Trapezoid(b=20, angle=33, H=4, height=5, centerXYZ=[true,false,true]);

//translate([0,10,0]) Isosceles_Triangle(b=20, angle=33);
//translate([30,10,0]) Isosceles_Triangle(b=20, H=5);
//translate([-30,10,0]) Isosceles_Triangle(angle=33, H=5, center=true);

//translate([15,-25,0]) Equilateral_Triangle(l=20);
//translate([-15,-25,0]) Equilateral_Triangle(H=20);






































ginnerWidth = 12;
gouterWidth = 18;
gwidthGap = 0.5;
gcrossOver = 9;

// Bar Connect Male Structure
//maleBar(40, ginnerWidth, gouterWidth, gcrossOver);

// Bar Connect Female Structure
//translate([-20,0,0]) femaleBar(100, ginnerWidth, gouterWidth, gwidthGap, gcrossOver);


module maleCrossBar(length, innerWidth, outerWidth, crossOver)
{

	translate([0,length/2+(outerWidth/2),0]) maleBar(length, innerWidth, outerWidth, crossOver);
	rotate([0,0,90]) translate([0,length/2-(outerWidth/2),0]) maleBar(length, innerWidth, outerWidth, crossOver);
}


module maleBar(length, innerWidth, outerWidth, crossOver)
{
	screwHoleLength = outerWidth + 2;
	screwHoleWidth = 1.5;

	rotate([90,0,0]) translate([0,0,crossOver])
	difference()
	{
		union()
		{
			translate([(outerWidth-innerWidth)/2,(outerWidth-innerWidth)/2,-crossOver]) cube([innerWidth,innerWidth,length]);
			cube([outerWidth,outerWidth,length - (crossOver*2)]);
		}

		translate([outerWidth/2,outerWidth+1,-crossOver/2]) rotate([90,0,0]) cylinder(screwHoleLength,screwHoleWidth,screwHoleWidth,$fn=50);

		translate([-1,outerWidth/2,-crossOver/2]) rotate([0,90,0]) cylinder(screwHoleLength,screwHoleWidth,screwHoleWidth,$fn=50);

		translate([outerWidth/2,outerWidth+1,length-crossOver-(crossOver/2)]) rotate([90,0,0]) cylinder(screwHoleLength,screwHoleWidth,screwHoleWidth,$fn=50);

		translate([-1,outerWidth/2,length-crossOver-(crossOver/2)]) rotate([0,90,0]) cylinder(screwHoleLength,screwHoleWidth,screwHoleWidth,$fn=50);
	}
}

module femaleBar(length, innerWidth, outerWidth, widthGap, crossOver)
{
	screwHoleLength = outerWidth + 2;
	innerWidth = innerWidth+widthGap;
	screwHoleWidth = 1.5;

	rotate([90,0,0])
	difference()
	{
		cube([outerWidth,outerWidth,length]);

		translate([(outerWidth-innerWidth-widthGap)/2,(outerWidth-innerWidth-widthGap)/2,-1]) cube([innerWidth+widthGap,innerWidth+widthGap,crossOver+2]);

		translate([(outerWidth-innerWidth-widthGap)/2,(outerWidth-innerWidth-widthGap)/2,length-(crossOver)-1]) cube([innerWidth+widthGap,innerWidth+widthGap,crossOver+2]);

		translate([outerWidth/2,outerWidth+1,crossOver/2]) rotate([90,0,0]) cylinder(screwHoleLength,screwHoleWidth,screwHoleWidth,$fn=50);

		translate([-1,outerWidth/2,crossOver/2]) rotate([0,90,0]) cylinder(screwHoleLength,screwHoleWidth,screwHoleWidth,$fn=50);

		translate([outerWidth/2,outerWidth+1,length-(crossOver/2)]) rotate([90,0,0]) cylinder(screwHoleLength,screwHoleWidth,screwHoleWidth,$fn=50);

		translate([-1,outerWidth/2,length-(crossOver/2)]) rotate([0,90,0]) cylinder(screwHoleLength,screwHoleWidth,screwHoleWidth,$fn=50);

	}
}

module hmaleBar(length, innerWidth, outerWidth, crossOver)
{
	screwHoleLength = outerWidth + 2;
	screwHoleWidth = 1.5;

	rotate([90,0,0]) translate([0,0,crossOver])
	difference()
	{
		union()
		{
			translate([(outerWidth-innerWidth)/2,(outerWidth-innerWidth)/2,-crossOver]) cube([innerWidth,innerWidth,length]);
			cube([outerWidth,outerWidth,length - (crossOver)]);
		}

		translate([outerWidth/2,outerWidth+1,-crossOver/2]) rotate([90,0,0]) cylinder(screwHoleLength,screwHoleWidth,screwHoleWidth,$fn=50);

		translate([-1,outerWidth/2,-crossOver/2]) rotate([0,90,0]) cylinder(screwHoleLength,screwHoleWidth,screwHoleWidth,$fn=50);
	}
}

module hfemaleBar(length, innerWidth, outerWidth, widthGap, crossOver)
{
	screwHoleLength = outerWidth + 2;
	innerWidth = innerWidth+widthGap;
	screwHoleWidth = 1.5;


	rotate([90,0,0])
	difference()
	{
		cube([outerWidth,outerWidth,length]);

		translate([(outerWidth-innerWidth)/2,(outerWidth-innerWidth)/2,-1]) cube([innerWidth,innerWidth,crossOver+2]);

		translate([outerWidth/2,outerWidth+1,crossOver/2]) rotate([90,0,0]) cylinder(screwHoleLength,screwHoleWidth,screwHoleWidth,$fn=50);

		translate([-1,outerWidth/2,crossOver/2]) rotate([0,90,0]) cylinder(screwHoleLength,screwHoleWidth,screwHoleWidth,$fn=50);

	}
}
